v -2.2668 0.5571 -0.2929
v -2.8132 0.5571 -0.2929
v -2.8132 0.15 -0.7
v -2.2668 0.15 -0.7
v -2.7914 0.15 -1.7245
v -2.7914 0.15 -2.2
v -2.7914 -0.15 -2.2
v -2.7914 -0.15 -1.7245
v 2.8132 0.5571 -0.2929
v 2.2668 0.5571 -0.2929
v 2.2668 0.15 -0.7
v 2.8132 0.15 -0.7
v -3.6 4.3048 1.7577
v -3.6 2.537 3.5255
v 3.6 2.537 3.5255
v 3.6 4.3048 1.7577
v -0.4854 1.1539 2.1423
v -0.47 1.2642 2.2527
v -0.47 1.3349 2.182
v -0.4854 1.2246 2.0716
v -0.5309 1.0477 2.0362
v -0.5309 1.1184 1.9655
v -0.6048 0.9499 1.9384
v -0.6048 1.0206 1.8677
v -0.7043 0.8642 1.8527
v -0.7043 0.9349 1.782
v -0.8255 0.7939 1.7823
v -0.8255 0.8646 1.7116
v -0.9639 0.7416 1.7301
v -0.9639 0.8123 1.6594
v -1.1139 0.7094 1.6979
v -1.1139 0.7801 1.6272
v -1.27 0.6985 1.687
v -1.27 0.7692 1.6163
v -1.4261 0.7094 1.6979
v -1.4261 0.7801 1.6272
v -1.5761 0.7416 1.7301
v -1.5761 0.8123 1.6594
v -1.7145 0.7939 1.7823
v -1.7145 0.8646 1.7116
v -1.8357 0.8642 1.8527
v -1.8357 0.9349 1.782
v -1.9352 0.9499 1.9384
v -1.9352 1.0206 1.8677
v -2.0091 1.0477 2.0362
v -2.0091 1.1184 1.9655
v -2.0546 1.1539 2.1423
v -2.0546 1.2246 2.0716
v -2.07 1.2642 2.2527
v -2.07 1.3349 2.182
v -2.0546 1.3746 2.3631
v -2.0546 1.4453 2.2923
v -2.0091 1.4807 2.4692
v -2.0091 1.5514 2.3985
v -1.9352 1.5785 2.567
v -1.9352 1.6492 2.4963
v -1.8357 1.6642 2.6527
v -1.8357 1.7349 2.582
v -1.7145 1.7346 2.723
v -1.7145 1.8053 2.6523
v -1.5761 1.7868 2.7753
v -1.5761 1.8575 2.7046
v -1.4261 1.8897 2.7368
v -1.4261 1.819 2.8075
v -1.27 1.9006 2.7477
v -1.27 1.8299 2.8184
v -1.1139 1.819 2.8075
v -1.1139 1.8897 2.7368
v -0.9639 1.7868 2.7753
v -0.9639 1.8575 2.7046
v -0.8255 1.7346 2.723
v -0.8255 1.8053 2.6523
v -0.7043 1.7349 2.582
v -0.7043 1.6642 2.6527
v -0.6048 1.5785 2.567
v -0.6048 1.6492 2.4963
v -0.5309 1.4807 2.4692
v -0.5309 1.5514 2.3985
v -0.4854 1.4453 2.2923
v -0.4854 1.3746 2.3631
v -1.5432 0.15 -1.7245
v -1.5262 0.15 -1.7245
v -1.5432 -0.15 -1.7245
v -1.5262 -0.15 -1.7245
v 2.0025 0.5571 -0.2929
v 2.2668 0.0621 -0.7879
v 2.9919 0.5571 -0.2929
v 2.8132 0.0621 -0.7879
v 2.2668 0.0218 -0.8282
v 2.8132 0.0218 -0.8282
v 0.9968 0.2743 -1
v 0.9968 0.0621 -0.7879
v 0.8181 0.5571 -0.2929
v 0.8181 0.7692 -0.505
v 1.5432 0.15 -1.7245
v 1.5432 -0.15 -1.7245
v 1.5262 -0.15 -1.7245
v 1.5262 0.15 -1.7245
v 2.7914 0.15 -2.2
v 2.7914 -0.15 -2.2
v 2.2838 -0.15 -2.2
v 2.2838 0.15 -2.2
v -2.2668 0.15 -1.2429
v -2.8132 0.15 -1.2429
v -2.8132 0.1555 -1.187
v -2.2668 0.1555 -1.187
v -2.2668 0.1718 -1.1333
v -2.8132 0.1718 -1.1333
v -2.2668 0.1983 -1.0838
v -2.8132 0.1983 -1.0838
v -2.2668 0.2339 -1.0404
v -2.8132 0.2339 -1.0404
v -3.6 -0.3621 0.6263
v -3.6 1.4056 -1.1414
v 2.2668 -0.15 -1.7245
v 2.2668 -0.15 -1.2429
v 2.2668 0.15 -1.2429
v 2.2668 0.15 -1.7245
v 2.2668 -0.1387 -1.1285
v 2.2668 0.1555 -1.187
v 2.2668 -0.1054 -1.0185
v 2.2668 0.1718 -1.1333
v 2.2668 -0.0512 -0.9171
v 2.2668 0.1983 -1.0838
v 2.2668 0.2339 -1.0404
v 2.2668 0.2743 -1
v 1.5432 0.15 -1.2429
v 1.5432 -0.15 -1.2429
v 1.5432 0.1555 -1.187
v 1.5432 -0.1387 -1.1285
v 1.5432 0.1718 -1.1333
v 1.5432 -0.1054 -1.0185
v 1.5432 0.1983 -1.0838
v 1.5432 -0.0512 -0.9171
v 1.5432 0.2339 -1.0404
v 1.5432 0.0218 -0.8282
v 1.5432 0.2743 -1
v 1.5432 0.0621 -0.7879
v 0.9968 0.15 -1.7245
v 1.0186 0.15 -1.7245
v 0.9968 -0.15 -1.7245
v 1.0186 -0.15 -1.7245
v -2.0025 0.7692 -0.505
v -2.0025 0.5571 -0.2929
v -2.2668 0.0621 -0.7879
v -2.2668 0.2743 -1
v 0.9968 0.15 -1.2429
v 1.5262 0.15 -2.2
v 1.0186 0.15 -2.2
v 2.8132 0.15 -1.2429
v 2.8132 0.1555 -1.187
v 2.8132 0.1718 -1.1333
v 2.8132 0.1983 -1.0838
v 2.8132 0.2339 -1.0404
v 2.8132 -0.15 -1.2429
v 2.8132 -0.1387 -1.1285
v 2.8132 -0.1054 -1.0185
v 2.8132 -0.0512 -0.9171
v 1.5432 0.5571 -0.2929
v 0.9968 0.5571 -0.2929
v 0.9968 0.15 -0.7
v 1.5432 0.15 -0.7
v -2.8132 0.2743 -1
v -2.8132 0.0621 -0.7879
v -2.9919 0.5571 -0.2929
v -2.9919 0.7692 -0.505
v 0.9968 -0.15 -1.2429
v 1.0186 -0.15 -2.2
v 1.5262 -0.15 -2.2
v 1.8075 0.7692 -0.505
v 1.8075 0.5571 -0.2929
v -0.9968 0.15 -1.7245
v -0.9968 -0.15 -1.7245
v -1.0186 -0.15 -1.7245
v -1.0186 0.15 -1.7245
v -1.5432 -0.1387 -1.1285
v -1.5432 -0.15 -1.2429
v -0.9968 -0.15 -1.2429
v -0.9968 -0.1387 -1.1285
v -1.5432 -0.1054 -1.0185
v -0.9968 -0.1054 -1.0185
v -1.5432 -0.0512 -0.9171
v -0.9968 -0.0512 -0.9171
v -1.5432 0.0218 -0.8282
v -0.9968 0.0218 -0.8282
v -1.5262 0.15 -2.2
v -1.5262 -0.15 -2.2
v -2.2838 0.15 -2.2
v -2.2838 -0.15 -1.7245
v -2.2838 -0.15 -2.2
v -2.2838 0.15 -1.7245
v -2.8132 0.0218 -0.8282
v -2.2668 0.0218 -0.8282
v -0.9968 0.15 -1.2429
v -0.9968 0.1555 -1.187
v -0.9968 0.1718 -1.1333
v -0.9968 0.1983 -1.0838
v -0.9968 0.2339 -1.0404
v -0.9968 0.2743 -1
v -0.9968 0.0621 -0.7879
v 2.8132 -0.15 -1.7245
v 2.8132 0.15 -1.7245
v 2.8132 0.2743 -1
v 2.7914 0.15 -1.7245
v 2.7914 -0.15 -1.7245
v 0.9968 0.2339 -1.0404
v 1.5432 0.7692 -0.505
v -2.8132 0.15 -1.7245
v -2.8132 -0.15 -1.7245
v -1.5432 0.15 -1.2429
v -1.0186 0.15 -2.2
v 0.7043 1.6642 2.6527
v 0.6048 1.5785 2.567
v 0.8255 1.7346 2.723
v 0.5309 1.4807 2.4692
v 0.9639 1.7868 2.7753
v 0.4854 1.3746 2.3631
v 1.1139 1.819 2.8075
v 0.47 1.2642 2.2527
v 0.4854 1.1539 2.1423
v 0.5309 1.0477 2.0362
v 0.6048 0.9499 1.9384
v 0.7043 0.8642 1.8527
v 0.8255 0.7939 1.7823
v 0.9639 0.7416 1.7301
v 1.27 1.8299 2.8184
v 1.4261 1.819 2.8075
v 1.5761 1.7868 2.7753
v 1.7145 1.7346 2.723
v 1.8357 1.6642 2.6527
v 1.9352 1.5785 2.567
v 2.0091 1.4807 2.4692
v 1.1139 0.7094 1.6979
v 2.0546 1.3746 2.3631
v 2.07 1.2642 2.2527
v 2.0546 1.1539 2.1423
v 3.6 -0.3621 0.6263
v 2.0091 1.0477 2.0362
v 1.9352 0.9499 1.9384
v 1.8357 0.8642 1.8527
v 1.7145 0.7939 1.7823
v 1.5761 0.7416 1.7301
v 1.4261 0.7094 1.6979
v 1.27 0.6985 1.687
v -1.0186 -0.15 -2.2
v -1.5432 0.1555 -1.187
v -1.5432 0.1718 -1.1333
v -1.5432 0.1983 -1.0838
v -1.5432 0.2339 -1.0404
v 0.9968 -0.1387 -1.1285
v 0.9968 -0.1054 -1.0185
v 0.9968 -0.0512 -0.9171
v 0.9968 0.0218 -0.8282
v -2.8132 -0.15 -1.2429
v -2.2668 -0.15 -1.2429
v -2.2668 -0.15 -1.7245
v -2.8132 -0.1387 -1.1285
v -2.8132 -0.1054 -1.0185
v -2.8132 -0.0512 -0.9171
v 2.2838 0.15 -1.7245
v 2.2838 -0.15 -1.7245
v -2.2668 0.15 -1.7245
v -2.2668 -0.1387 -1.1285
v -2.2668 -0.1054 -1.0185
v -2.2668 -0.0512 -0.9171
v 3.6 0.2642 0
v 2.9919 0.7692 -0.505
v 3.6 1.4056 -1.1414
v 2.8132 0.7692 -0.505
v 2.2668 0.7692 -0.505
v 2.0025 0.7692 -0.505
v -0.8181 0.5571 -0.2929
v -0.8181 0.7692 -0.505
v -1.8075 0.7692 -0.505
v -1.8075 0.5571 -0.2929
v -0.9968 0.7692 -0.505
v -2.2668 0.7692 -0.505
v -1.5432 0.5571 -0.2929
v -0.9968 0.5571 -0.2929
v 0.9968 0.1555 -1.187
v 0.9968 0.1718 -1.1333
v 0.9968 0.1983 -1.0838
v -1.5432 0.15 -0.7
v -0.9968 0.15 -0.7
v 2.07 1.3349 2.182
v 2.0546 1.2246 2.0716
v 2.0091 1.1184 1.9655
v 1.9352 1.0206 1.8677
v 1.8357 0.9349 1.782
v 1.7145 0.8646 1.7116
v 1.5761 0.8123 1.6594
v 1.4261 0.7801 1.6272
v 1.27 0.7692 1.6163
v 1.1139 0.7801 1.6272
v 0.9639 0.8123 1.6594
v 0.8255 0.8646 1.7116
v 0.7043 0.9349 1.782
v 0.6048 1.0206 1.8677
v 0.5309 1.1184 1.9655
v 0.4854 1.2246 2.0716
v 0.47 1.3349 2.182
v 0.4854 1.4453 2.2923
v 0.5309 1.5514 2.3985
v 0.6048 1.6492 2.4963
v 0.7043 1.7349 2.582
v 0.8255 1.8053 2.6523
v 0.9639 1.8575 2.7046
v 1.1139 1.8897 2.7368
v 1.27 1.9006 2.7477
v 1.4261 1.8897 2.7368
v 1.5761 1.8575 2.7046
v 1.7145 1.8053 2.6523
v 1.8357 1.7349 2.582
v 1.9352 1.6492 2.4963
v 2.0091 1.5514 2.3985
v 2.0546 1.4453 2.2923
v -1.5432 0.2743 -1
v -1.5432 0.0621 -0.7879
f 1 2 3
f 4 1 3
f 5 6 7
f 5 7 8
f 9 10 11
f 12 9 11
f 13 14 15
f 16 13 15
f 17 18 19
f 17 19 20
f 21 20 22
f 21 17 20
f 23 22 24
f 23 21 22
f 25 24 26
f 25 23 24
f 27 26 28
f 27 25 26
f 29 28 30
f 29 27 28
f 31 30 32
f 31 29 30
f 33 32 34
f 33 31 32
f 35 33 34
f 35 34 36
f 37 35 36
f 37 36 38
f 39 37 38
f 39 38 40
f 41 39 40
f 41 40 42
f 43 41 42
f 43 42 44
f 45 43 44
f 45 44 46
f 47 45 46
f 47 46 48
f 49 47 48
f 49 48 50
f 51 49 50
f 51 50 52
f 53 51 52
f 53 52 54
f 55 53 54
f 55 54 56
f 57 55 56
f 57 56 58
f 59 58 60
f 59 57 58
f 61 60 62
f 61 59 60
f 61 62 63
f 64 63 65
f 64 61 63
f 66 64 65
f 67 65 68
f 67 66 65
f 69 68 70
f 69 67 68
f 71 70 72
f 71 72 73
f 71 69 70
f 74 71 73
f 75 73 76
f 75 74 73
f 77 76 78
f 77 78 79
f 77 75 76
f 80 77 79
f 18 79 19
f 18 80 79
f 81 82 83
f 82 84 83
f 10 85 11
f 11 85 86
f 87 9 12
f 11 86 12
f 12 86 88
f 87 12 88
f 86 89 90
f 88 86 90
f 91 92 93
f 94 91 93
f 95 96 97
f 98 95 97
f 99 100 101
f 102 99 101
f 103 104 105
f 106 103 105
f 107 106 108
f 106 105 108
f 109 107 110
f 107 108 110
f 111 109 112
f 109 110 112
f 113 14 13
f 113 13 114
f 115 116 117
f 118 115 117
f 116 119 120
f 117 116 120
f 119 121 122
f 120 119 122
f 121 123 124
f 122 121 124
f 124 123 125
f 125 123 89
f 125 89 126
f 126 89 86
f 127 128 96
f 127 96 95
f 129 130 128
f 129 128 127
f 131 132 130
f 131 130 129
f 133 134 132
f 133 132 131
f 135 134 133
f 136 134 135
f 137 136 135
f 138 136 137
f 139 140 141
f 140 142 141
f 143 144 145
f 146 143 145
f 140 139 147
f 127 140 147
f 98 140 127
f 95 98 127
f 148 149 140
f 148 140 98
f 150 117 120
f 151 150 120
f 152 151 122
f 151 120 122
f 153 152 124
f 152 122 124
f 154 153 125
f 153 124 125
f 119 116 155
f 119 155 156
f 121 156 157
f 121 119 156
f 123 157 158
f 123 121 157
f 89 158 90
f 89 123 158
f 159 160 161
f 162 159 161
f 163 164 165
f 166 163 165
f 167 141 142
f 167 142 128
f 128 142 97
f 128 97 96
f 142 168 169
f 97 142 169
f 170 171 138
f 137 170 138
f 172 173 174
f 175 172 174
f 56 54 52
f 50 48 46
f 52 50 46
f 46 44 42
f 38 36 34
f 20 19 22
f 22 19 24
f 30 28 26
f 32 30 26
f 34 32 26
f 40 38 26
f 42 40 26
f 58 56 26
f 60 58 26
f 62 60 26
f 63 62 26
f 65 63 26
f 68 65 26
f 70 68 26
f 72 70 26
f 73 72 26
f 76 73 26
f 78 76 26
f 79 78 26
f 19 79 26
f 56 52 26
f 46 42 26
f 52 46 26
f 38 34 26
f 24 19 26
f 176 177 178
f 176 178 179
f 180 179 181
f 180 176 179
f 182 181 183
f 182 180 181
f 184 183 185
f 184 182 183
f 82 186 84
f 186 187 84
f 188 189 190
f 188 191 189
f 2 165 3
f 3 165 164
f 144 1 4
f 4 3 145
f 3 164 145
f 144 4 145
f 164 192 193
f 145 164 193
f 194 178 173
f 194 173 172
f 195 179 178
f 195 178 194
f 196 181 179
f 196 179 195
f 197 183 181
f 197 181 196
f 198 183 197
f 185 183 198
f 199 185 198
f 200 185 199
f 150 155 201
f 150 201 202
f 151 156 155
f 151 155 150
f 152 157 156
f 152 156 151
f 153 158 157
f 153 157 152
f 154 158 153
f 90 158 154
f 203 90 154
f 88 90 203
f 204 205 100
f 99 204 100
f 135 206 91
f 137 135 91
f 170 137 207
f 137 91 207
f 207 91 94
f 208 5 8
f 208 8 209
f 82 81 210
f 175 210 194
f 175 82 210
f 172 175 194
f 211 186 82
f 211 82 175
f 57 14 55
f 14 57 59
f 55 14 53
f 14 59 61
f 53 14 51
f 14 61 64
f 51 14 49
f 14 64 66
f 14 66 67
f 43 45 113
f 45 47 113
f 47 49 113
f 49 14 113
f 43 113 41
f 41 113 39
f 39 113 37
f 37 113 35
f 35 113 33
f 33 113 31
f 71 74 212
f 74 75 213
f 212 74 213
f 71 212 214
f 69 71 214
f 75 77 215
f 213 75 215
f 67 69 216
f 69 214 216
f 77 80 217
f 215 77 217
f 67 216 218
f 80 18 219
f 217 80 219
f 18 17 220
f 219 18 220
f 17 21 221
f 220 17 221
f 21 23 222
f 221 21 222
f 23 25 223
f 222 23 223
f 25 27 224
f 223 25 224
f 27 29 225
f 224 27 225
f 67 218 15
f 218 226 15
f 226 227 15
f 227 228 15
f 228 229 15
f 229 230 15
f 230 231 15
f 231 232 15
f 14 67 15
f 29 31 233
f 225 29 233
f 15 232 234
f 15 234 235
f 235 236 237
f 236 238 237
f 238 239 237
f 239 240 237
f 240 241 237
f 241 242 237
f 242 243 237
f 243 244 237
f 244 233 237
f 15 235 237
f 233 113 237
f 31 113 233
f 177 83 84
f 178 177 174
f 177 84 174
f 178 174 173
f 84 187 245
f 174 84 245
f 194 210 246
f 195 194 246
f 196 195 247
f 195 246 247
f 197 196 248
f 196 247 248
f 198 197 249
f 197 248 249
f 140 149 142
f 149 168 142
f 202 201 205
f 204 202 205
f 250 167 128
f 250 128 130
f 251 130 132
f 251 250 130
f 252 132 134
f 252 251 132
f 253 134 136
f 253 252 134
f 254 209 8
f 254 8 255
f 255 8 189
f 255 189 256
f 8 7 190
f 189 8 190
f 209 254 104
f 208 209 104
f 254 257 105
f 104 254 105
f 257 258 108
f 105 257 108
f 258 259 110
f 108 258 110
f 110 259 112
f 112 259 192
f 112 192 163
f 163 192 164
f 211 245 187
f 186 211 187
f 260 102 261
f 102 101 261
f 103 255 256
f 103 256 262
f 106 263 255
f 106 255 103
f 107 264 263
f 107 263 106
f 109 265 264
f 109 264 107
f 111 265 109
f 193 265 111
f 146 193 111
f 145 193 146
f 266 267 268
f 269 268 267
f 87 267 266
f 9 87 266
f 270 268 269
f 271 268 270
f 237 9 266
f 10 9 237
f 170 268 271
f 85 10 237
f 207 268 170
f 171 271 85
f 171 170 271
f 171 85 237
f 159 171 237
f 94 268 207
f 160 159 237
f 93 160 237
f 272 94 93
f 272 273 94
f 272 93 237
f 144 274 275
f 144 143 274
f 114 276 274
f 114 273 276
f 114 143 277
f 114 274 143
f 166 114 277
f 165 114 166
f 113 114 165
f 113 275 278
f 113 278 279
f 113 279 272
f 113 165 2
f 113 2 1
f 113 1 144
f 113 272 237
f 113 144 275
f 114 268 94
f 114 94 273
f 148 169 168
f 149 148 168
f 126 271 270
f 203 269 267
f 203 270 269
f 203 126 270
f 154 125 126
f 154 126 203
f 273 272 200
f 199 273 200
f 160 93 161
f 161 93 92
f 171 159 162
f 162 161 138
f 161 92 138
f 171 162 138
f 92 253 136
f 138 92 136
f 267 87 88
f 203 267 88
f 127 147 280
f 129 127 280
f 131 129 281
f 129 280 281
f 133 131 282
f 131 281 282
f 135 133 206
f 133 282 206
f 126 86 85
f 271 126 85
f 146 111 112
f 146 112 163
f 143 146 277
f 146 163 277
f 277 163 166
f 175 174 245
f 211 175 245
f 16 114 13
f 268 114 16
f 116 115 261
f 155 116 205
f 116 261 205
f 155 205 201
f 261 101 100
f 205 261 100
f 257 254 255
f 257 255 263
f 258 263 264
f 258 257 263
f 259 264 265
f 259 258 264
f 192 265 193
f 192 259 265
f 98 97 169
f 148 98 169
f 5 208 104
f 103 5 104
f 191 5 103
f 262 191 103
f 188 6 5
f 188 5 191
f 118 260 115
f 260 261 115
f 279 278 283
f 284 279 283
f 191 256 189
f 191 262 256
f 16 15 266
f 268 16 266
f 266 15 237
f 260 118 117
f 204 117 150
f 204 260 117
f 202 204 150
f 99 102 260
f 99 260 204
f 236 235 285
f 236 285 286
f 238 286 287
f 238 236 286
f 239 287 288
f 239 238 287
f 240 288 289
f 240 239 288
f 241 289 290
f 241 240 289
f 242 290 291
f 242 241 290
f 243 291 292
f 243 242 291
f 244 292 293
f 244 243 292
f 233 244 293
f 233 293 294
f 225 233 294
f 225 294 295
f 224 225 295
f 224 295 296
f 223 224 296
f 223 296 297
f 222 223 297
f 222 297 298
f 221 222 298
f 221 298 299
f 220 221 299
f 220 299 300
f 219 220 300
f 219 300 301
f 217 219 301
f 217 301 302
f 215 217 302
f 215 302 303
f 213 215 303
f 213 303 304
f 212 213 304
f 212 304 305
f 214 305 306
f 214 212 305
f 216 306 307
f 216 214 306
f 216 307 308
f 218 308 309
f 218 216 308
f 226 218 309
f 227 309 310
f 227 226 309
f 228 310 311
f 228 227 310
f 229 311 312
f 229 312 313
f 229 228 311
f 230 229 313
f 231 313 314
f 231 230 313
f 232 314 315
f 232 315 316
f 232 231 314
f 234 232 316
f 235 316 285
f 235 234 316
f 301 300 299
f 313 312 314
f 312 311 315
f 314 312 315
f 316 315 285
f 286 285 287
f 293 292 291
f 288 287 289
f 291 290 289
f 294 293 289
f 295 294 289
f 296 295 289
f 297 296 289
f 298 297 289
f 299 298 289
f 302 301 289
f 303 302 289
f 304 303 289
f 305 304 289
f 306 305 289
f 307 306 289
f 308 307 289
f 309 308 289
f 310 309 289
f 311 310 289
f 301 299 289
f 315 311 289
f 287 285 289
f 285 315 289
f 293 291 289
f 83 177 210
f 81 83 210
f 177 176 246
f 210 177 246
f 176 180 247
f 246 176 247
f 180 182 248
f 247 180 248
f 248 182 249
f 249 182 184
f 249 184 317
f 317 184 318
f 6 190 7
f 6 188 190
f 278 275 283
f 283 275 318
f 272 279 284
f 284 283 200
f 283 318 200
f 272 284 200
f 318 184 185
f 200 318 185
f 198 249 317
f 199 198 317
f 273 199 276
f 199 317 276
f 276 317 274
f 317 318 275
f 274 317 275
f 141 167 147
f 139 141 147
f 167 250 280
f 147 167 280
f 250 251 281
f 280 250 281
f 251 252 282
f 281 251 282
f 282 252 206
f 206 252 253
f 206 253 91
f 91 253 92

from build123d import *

# Parameters (mm, degrees)
ESQUISSE2_W          = 7.2
ESQUISSE2_H          = 2.5
BOITIER_DEPTH        = 4.1
FENETRECAPTEUR_START = -1.45
ESQUISSE4_R          = 0.8
FENETRECAPTEUR_DEPTH = 0.1
PATTES_DEPTH         = 0.15
PLIAGE_START         = -5
PLIAGE_1_OUTLINE_W   = 7.2
PLIAGE_1_OUTLINE_H   = 4.1
PLIAGE_1_DEPTH       = 4.301040764
PLIAGE_START_2       = -0.698959236
PLIAGE_1_2_OUTLINE_R = 0.8
PLIAGE_1_2_DEPTH     = 0.1
PLIAGE_START_3       = -0.598959236
PLIAGE_1_3_OUTLINE_W = 7.2
PLIAGE_1_3_OUTLINE_H = 4.1
PLIAGE_1_3_DEPTH     = 2.4
PLIAGE_1_4_OUTLINE_W = 7.2
PLIAGE_1_4_OUTLINE_H = 4.1
PLIAGE_1_4_OUTLINE_R = 0.8
PLIAGE_1_4_DEPTH     = 0.1
PLIAGE_START_4       = -3.6
PLIAGE_1_5_DEPTH     = 7.2
PLIAGE_START_5       = -2.813242849
PLIAGE_1_6_DEPTH     = 0.546485698
PLIAGE_START_6       = -1.543242849
PLIAGE_1_7_DEPTH     = 0.546485698
PLIAGE_START_7       = 0.996757151
PLIAGE_1_8_DEPTH     = 0.546485698
PLIAGE_START_8       = 2.266757151
PLIAGE_1_9_DEPTH     = 0.546485698
PLIAGE_START_9       = 0.601040763
PLIAGE_1_10_DEPTH    = 0.300000001


with BuildPart() as part:
    # Esquisse2 → Boitier (new body)
    with BuildSketch(Plane.XY):
        with Locations((0, -0.2)):
            Rectangle(ESQUISSE2_W, ESQUISSE2_H)
    extrude(amount=BOITIER_DEPTH)

    # Esquisse4 → FenetreCapteur (cut)
    with BuildSketch(Plane(origin=(0, 0, 0), x_dir=(1, 0, 0), z_dir=(0, 1, 0)).offset(FENETRECAPTEUR_START)):
        with Locations(Location((-1.27, -2.3, 0), (0, 0, 180))):
            Circle(ESQUISSE4_R)
        with Locations(Location((1.27, -2.3, 0), (0, 0, 180))):
            Circle(ESQUISSE4_R)
    extrude(amount=FENETRECAPTEUR_DEPTH, mode=Mode.SUBTRACT)

    # Esquisse5 → Pattes (add, symmetric)
    with BuildSketch(Plane(origin=(0, 0, 0), x_dir=(1, 0, 0), z_dir=(0, 1, 0))):
        Polygon((2.791437744, 2.2), (2.283797649, 2.2), (2.283797649, 1.724539267), (2.266757151, 1.724539267), (2.266757151, 0.7), (2.002499851, 0), (2.991852509, 0), (2.813242849, 0.7), (2.813242849, 1.724539267), (2.791437744, 1.724539267), align=None)
        Polygon((1.526202351, 2.2), (1.018562256, 2.2), (1.018562256, 1.724539267), (0.996757151, 1.724539267), (0.996757151, 0.7), (0.818147491, 0), (1.807500149, 0), (1.543242849, 0.7), (1.543242849, 1.724539267), (1.526202351, 1.724539267), align=None)
        Polygon((-1.018562256, 2.2), (-1.526202351, 2.2), (-1.526202351, 1.724539267), (-1.543242849, 1.724539267), (-1.543242849, 0.7), (-1.807500149, 0), (-0.818147491, 0), (-0.996757151, 0.7), (-0.996757151, 1.724539267), (-1.018562256, 1.724539267), align=None)
        Polygon((-2.283797649, 2.2), (-2.791437744, 2.2), (-2.791437744, 1.724539267), (-2.813242849, 1.724539267), (-2.813242849, 0.7), (-2.991852509, 0), (-2.002499851, 0), (-2.266757151, 0.7), (-2.266757151, 1.724539267), (-2.283797649, 1.724539267), align=None)
    extrude(amount=PATTES_DEPTH, both=True)

    # Pliage 1: read off the stored shape, not the designer's step
    # Pliage 1 outline → Pliage 1 (cut)
    with BuildSketch(Plane(origin=(0, 0, 0), x_dir=(1, 0, 0), z_dir=(0, 0.707106781186546, -0.707106781186549)).offset(PLIAGE_START)):
        with Locations((0, -2.236827202)):
            Rectangle(PLIAGE_1_OUTLINE_W, PLIAGE_1_OUTLINE_H)
    extrude(amount=PLIAGE_1_DEPTH, mode=Mode.SUBTRACT)

    # Pliage 1 2 outline → Pliage 1 2 (cut)
    with BuildSketch(Plane(origin=(0, 0, 0), x_dir=(1, 0, 0), z_dir=(0, 0.707106781186546, -0.707106781186549)).offset(PLIAGE_START_2)):
        with Locations((-1.27, -2.486827202)):
            Circle(PLIAGE_1_2_OUTLINE_R)
        with Locations((1.27, -2.486827202)):
            Circle(PLIAGE_1_2_OUTLINE_R)
    extrude(amount=PLIAGE_1_2_DEPTH, mode=Mode.SUBTRACT)

    # Pliage 1 3 outline → Pliage 1 3 (add)
    with BuildSketch(Plane(origin=(0, 0, 0), x_dir=(1, 0, 0), z_dir=(0, 0.707106781186546, -0.707106781186549)).offset(PLIAGE_START_3)):
        with Locations((0, -2.236827202)):
            Rectangle(PLIAGE_1_3_OUTLINE_W, PLIAGE_1_3_OUTLINE_H)
    extrude(amount=PLIAGE_1_3_DEPTH)

    # Pliage 1 4 outline → Pliage 1 4 (add)
    with BuildSketch(Plane(origin=(0, 0, 0), x_dir=(1, 0, 0), z_dir=(0, 0.707106781186546, -0.707106781186549)).offset(PLIAGE_START_2)):
        with Locations((0, -2.236827202)):
            Rectangle(PLIAGE_1_4_OUTLINE_W, PLIAGE_1_4_OUTLINE_H)
        with Locations((-1.27, -2.486827202)):
            Circle(PLIAGE_1_4_OUTLINE_R, mode=Mode.SUBTRACT)
        with Locations((1.27, -2.486827202)):
            Circle(PLIAGE_1_4_OUTLINE_R, mode=Mode.SUBTRACT)
    extrude(amount=PLIAGE_1_4_DEPTH)

    # Pliage 1 5 outline → Pliage 1 5 (cut)
    with BuildSketch(Plane.YZ.offset(PLIAGE_START_4)):
        with BuildLine():
            Line((0.021781873, -0.828218127), (0.15, -0.7))
            Line((0.15, -0.7), (0.15, 0))
            Line((0.15, 0), (0.264213563, 0))
            Line((0.264213563, 0), (-1.35, 1.614213563))
            Line((-1.35, 1.614213563), (-1.45, 1.714213563))
            Line((-1.45, 1.714213563), (-1.45, 0))
            Line((-1.45, 0), (-0.15, 0))
            Line((-0.15, 0), (-0.15, -1.242936254))
            ThreePointArc((-0.15, -1.242936254), (-0.105355346, -1.018492421), (0.021781873, -0.828218127))
        make_face()
    extrude(amount=PLIAGE_1_5_DEPTH, mode=Mode.SUBTRACT)

    # Pliage 1 6 outline → Pliage 1 6 (add)
    with BuildSketch(Plane.YZ.offset(PLIAGE_START_5)):
        with BuildLine():
            Line((0.769238816, -0.505025253), (0.557106781, -0.292893218))
            Line((0.557106781, -0.292893218), (0.15, -0.7))
            Line((0.15, -0.7), (0.15, -1.242936254))
            ThreePointArc((0.15, -1.242936254), (0.171808514, -1.133297451), (0.233913907, -1.040350162))
            Line((0.233913907, -1.040350162), (0.769238816, -0.505025253))
        make_face()
    extrude(amount=PLIAGE_1_6_DEPTH)

    # Pliage 1 7 outline → Pliage 1 7 (add)
    with BuildSketch(Plane.YZ.offset(PLIAGE_START_6)):
        with BuildLine():
            Line((0.769238816, -0.505025253), (0.557106781, -0.292893218))
            Line((0.557106781, -0.292893218), (0.15, -0.7))
            Line((0.15, -0.7), (0.15, -1.242936254))
            ThreePointArc((0.15, -1.242936254), (0.171808514, -1.133297451), (0.233913907, -1.040350162))
            Line((0.233913907, -1.040350162), (0.769238816, -0.505025253))
        make_face()
    extrude(amount=PLIAGE_1_7_DEPTH)

    # Pliage 1 8 outline → Pliage 1 8 (add)
    with BuildSketch(Plane.YZ.offset(PLIAGE_START_7)):
        with BuildLine():
            Line((0.769238816, -0.505025253), (0.557106781, -0.292893218))
            Line((0.557106781, -0.292893218), (0.15, -0.7))
            Line((0.15, -0.7), (0.15, -1.242936254))
            ThreePointArc((0.15, -1.242936254), (0.171808514, -1.133297451), (0.233913907, -1.040350162))
            Line((0.233913907, -1.040350162), (0.769238816, -0.505025253))
        make_face()
    extrude(amount=PLIAGE_1_8_DEPTH)

    # Pliage 1 9 outline → Pliage 1 9 (add)
    with BuildSketch(Plane.YZ.offset(PLIAGE_START_8)):
        with BuildLine():
            Line((0.769238816, -0.505025253), (0.557106781, -0.292893218))
            Line((0.557106781, -0.292893218), (0.15, -0.7))
            Line((0.15, -0.7), (0.15, -1.242936254))
            ThreePointArc((0.15, -1.242936254), (0.171808514, -1.133297451), (0.233913907, -1.040350162))
            Line((0.233913907, -1.040350162), (0.769238816, -0.505025253))
        make_face()
    extrude(amount=PLIAGE_1_9_DEPTH)

    # Pliage 1 10 outline → Pliage 1 10 (add)
    with BuildSketch(Plane(origin=(0, 0, 0), x_dir=(1, 0, 0), z_dir=(0, 0.707106781186546, -0.707106781186549)).offset(PLIAGE_START_9)):
        Polygon((2.813242849, 0.513172798), (2.813242849, -0.186827202), (2.991852509, -0.186827202), align=None)
        Polygon((-2.991852509, -0.186827202), (-2.813242849, -0.186827202), (-2.813242849, 0.513172798), align=None)
        Polygon((-2.266757151, -0.186827202), (-2.002499851, -0.186827202), (-2.266757151, 0.513172798), align=None)
        Polygon((-1.807500149, -0.186827202), (-1.543242849, -0.186827202), (-1.543242849, 0.513172798), align=None)
        Polygon((-0.996757151, -0.186827202), (-0.818147491, -0.186827202), (-0.996757151, 0.513172798), align=None)
        Polygon((0.818147491, -0.186827202), (0.996757151, -0.186827202), (0.996757151, 0.513172798), align=None)
        Polygon((1.543242849, -0.186827202), (1.807500149, -0.186827202), (1.543242849, 0.513172798), align=None)
        Polygon((2.266757151, 0.513172798), (2.002499851, -0.186827202), (2.266757151, -0.186827202), align=None)
    extrude(amount=PLIAGE_1_10_DEPTH)


solid = part.part
